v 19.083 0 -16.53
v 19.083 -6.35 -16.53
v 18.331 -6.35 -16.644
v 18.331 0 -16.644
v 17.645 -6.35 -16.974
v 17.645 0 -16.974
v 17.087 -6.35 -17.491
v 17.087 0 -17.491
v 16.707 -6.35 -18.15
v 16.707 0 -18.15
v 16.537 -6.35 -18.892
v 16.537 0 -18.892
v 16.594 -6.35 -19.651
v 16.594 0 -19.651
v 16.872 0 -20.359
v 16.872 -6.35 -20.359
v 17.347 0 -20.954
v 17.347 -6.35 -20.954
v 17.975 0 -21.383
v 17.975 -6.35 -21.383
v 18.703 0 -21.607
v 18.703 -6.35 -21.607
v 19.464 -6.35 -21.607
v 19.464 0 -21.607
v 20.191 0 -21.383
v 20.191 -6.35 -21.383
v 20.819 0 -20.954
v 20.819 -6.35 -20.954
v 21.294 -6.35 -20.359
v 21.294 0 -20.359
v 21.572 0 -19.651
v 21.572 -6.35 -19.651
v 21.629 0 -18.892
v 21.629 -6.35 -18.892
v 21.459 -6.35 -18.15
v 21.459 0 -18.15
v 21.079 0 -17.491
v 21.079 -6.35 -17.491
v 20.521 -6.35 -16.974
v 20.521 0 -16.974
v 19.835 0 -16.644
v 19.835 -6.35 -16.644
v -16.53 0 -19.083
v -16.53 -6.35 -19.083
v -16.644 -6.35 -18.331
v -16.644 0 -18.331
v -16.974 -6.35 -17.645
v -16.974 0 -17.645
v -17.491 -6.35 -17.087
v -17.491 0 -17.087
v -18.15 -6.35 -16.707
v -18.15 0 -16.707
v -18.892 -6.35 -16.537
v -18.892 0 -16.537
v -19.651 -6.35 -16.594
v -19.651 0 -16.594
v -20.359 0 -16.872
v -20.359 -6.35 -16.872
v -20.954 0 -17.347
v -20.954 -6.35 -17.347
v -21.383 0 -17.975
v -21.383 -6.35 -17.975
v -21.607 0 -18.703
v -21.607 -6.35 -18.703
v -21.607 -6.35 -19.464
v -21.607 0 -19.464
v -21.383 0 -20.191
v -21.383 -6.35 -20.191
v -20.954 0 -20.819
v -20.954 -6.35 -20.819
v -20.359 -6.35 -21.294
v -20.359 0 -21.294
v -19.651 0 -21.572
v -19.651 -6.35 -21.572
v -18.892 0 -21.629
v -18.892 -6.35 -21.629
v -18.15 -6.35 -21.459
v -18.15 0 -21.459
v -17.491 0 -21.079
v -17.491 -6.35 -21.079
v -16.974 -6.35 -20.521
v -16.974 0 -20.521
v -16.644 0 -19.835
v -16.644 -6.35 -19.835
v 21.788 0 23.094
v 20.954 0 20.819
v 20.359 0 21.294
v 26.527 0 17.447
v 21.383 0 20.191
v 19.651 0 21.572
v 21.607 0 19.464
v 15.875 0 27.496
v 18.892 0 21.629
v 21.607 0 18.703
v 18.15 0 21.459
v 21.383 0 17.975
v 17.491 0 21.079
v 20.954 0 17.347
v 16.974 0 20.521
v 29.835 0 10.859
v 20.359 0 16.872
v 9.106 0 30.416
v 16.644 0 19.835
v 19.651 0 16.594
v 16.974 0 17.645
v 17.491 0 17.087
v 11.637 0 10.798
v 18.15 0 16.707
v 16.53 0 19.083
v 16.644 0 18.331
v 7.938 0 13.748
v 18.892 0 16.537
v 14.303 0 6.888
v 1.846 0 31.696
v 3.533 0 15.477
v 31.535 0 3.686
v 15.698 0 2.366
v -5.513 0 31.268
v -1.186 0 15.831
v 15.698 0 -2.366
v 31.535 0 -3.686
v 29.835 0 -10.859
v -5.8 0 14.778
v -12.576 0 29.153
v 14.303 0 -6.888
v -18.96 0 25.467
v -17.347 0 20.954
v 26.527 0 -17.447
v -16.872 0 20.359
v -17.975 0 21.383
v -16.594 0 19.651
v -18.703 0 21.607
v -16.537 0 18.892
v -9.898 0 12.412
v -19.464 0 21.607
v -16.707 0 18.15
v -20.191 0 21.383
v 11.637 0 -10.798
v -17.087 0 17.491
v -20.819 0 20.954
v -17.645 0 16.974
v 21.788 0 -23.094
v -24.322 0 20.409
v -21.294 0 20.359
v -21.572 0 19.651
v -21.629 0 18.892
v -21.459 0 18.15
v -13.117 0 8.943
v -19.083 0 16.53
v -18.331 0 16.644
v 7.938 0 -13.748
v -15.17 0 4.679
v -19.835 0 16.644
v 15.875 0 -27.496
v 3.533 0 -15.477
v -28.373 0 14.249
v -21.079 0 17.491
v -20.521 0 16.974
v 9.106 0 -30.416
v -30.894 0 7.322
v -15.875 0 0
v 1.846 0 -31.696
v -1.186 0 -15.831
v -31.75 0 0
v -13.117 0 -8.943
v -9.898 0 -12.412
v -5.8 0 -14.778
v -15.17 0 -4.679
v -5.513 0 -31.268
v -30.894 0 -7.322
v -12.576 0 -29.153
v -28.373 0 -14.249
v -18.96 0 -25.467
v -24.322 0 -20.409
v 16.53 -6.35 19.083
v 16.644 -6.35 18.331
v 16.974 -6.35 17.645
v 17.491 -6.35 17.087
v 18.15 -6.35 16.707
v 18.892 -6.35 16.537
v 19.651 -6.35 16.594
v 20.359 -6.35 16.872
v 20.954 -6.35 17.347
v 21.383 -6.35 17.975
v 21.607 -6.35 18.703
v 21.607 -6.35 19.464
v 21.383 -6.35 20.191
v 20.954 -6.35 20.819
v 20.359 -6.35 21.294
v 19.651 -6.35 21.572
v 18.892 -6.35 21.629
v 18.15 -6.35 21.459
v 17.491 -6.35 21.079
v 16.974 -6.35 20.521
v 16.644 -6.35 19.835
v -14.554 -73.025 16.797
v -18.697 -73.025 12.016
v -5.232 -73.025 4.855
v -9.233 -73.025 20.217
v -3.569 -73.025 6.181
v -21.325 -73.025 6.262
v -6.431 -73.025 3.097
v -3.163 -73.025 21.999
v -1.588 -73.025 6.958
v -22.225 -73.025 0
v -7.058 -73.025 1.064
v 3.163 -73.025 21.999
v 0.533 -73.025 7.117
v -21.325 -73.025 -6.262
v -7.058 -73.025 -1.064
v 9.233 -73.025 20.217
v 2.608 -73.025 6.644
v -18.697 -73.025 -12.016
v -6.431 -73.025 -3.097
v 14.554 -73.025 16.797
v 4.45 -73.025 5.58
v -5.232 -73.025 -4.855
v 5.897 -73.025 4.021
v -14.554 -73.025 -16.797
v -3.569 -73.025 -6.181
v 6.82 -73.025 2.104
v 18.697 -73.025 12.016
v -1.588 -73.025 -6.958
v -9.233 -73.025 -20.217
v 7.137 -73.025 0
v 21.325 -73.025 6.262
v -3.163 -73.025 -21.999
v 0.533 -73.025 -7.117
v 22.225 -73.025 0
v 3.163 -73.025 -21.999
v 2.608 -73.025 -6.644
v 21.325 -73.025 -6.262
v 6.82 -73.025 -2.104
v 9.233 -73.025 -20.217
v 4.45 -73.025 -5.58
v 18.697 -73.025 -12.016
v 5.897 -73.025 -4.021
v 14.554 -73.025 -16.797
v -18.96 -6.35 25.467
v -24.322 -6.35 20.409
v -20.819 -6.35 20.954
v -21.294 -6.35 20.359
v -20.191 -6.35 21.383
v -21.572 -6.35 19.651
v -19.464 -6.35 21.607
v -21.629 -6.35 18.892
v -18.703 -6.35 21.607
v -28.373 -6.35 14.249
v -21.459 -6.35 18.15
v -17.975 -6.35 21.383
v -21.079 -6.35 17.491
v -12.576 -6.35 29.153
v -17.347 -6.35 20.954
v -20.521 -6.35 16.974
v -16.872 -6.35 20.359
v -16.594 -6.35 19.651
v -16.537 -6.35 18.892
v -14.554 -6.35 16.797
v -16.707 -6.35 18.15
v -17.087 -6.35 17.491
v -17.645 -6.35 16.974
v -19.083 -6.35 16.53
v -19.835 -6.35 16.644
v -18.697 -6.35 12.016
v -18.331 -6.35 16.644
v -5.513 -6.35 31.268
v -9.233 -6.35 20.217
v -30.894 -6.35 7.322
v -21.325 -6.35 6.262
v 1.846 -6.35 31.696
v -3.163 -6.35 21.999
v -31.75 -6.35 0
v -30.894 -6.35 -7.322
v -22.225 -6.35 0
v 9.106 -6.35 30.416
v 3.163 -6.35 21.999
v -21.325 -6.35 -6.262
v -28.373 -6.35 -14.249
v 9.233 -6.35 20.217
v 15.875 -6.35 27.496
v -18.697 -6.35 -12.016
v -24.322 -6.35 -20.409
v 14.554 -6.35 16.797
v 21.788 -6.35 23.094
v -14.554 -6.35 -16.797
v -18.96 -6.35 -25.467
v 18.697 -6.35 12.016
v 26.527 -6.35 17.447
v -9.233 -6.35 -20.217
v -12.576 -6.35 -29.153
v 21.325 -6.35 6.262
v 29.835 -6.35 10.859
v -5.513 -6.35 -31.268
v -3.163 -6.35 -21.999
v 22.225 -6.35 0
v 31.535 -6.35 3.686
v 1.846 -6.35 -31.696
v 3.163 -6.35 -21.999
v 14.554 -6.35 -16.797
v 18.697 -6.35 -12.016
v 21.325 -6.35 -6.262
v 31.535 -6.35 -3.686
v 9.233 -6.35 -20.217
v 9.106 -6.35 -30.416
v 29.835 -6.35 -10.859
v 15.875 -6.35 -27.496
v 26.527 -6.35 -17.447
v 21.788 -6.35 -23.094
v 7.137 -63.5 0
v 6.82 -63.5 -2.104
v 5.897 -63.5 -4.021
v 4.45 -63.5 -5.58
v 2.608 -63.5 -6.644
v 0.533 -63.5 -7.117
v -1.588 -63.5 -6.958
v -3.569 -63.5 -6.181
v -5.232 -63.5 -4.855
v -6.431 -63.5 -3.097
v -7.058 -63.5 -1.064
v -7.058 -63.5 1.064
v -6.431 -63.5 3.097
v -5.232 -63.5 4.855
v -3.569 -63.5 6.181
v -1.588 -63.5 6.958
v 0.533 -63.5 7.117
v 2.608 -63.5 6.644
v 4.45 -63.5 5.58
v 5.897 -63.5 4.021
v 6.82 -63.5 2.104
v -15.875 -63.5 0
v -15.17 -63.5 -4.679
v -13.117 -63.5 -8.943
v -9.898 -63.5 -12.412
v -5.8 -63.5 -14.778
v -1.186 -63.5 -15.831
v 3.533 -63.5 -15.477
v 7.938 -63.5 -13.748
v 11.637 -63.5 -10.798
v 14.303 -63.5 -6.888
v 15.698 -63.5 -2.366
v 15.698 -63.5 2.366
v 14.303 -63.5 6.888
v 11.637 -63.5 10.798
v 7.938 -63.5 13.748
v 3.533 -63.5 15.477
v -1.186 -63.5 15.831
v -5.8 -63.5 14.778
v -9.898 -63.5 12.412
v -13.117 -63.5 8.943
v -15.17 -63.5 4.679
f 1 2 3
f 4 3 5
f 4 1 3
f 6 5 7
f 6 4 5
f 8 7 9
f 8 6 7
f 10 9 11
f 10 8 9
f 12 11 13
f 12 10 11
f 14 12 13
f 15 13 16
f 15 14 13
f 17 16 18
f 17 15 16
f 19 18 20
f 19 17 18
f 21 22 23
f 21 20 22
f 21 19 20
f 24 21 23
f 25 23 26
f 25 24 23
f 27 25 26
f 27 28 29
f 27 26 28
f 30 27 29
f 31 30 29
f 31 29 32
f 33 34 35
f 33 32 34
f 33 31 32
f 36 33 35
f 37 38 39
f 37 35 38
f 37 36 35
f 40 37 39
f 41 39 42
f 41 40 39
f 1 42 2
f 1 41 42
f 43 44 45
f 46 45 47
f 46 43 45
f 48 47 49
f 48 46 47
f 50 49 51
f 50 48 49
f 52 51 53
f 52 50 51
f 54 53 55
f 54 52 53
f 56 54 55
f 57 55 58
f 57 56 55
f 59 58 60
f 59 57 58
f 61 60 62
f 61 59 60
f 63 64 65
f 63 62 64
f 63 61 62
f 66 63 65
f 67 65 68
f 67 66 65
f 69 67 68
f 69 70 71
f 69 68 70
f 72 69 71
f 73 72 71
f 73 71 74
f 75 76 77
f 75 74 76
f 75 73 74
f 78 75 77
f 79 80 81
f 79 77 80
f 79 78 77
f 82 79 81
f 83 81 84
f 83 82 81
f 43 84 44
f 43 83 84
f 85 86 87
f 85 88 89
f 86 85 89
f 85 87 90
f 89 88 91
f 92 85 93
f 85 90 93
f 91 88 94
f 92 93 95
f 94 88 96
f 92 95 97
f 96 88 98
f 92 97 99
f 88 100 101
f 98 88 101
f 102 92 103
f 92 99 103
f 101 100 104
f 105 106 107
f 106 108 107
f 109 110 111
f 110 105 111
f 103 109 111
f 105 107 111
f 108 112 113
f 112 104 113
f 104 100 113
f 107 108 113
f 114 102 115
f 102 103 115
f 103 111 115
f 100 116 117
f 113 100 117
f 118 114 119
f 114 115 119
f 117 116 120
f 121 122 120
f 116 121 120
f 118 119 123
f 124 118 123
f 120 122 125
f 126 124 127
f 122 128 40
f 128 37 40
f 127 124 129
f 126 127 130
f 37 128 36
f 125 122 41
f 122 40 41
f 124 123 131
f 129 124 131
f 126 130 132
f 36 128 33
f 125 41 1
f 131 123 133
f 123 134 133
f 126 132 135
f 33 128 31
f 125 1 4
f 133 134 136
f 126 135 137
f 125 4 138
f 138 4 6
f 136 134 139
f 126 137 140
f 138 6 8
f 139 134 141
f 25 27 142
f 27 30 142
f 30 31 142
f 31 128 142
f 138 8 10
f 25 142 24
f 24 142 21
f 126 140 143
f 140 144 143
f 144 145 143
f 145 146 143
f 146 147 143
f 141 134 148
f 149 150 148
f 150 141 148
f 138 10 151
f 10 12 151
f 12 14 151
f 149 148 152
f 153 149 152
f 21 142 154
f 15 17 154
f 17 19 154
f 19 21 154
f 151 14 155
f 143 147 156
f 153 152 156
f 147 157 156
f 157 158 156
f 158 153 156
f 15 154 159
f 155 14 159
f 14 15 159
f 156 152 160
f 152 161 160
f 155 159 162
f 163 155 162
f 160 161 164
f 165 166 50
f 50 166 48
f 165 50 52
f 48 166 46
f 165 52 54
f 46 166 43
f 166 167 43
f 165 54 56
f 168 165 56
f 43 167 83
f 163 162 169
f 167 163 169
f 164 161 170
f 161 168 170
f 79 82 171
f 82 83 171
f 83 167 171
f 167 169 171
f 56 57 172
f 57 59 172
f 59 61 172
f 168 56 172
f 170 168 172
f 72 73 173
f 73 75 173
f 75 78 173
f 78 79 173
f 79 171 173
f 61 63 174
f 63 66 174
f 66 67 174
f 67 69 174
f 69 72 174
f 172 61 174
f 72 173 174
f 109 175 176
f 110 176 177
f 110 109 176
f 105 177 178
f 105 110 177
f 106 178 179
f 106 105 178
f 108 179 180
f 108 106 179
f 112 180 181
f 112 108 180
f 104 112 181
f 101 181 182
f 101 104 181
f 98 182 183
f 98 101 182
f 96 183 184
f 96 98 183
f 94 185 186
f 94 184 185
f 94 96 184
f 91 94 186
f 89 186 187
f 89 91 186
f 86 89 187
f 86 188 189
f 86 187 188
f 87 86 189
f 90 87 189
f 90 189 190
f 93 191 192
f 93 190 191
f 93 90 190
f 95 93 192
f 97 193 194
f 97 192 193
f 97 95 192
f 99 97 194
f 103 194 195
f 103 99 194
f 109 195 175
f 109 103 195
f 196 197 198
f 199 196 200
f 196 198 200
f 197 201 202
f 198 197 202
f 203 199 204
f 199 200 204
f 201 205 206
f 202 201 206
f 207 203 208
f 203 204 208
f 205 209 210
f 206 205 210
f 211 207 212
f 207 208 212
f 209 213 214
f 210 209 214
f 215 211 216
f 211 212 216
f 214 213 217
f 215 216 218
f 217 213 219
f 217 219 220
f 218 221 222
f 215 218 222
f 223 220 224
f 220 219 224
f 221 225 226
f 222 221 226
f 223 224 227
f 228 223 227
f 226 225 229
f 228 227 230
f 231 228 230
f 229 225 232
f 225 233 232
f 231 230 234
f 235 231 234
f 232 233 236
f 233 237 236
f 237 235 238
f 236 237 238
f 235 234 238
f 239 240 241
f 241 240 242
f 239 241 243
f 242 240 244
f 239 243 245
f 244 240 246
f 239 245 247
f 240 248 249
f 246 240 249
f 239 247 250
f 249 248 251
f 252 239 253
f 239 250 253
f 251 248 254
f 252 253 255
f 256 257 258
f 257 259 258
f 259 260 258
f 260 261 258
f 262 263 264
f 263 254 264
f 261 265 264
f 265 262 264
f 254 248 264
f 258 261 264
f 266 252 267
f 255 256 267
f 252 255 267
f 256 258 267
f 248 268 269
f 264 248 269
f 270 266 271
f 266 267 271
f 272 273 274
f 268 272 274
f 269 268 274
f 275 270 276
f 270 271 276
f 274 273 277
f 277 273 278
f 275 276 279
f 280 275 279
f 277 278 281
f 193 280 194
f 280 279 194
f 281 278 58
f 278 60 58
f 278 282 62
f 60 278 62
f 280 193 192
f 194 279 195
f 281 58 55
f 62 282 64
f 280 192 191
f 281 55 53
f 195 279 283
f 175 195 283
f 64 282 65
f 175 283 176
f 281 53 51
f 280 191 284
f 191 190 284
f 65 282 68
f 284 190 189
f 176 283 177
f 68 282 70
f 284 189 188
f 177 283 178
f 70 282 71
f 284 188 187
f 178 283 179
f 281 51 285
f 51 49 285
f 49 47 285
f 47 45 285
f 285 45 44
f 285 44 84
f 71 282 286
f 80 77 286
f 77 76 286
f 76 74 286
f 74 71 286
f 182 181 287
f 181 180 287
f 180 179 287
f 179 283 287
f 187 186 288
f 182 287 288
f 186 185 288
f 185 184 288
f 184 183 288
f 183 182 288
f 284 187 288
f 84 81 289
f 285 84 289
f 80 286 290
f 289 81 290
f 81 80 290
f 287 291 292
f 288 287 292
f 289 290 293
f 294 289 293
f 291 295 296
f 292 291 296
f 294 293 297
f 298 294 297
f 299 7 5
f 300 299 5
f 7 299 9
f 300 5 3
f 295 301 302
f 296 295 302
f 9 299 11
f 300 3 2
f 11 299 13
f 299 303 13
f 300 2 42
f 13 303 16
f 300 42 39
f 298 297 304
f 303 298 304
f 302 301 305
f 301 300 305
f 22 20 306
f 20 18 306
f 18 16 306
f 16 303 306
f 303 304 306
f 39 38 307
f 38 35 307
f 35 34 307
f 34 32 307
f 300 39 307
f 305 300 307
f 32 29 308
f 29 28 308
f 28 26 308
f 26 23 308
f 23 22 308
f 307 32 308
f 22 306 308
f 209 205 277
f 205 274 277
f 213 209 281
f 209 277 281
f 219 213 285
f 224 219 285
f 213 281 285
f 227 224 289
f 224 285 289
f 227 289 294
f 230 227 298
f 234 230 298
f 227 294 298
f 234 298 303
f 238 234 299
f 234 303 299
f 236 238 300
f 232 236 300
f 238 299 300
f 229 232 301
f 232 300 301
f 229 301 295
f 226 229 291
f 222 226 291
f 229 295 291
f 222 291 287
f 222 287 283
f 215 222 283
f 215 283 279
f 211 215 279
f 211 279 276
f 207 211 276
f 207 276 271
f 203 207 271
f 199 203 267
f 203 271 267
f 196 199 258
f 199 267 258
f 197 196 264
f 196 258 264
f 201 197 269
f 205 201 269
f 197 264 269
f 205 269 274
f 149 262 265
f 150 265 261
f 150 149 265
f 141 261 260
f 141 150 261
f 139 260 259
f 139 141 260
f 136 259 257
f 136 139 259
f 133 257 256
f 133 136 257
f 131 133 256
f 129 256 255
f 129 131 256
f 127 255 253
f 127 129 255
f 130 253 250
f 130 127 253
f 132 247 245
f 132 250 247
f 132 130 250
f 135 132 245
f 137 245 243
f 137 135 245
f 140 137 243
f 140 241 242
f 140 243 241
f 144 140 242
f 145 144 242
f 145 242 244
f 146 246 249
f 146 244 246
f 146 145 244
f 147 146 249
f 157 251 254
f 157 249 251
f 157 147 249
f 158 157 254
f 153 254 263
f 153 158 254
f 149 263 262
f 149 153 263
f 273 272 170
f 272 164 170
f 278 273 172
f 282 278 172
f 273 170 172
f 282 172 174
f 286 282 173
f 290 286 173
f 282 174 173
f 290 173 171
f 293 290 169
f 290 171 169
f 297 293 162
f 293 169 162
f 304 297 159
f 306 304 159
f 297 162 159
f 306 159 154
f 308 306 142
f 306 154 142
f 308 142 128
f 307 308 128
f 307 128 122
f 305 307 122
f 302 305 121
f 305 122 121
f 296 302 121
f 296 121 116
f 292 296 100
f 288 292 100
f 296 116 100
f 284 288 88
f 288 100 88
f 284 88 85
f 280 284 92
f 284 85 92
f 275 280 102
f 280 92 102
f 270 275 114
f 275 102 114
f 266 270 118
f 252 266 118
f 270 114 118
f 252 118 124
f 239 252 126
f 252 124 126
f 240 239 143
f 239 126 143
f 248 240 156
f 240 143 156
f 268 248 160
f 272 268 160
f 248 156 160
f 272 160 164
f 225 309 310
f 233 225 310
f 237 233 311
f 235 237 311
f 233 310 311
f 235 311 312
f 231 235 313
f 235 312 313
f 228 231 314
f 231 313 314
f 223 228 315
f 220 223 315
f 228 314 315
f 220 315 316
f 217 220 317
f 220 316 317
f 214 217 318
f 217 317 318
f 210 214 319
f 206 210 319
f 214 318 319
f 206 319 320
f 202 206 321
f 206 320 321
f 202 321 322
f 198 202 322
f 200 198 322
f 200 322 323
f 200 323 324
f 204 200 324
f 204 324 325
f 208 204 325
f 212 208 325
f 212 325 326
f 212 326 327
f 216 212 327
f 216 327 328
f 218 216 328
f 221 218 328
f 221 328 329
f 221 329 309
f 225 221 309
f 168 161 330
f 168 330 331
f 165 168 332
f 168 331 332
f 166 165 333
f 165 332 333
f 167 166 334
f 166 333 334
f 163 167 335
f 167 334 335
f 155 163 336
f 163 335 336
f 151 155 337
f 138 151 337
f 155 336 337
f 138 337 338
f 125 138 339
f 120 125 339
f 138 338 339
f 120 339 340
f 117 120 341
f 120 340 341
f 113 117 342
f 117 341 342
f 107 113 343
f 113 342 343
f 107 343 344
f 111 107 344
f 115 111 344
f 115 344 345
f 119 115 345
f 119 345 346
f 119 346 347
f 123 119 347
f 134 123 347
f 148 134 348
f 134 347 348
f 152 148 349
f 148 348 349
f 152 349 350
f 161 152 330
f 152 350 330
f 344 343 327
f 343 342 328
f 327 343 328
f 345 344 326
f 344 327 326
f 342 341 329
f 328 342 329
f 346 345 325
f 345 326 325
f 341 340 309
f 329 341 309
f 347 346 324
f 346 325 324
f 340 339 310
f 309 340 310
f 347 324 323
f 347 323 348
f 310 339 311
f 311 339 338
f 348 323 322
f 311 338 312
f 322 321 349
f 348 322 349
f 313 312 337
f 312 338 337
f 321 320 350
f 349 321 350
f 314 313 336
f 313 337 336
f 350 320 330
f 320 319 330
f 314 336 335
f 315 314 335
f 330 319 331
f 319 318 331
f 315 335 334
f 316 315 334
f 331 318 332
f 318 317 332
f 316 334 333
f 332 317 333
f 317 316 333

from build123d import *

# Parameters (mm, degrees)
PIPE_TAP_DRILL_FOR_3_8_TAP1_D     = 14.2748
PIPE_TAP_DRILL_FOR_3_8_TAP1_DEPTH = 25.4
PIPE_TAP_DRILL_FOR_3_8_TAP1_TIP   = 4.288582582
CIRPATTERN1_COUNT                 = 4


with BuildPart() as part:
    # Sketch1 → Revolve1 (revolve)
    with BuildSketch(Plane.XY):
        Polygon((-31.75, 0), (-15.875, 0), (-15.875, -63.5), (0, -63.5), (0, -73.025), (-22.225, -73.025), (-22.225, -6.35), (-31.75, -6.35), align=None)
    revolve(axis=Axis((0, 0, 0), (0, -1, 0)))

    # Pipe Tap Drill for 3/8 Tap1
    with Locations(Plane(origin=(0, -73.025, 0), x_dir=(-1, 0, 0), z_dir=(0, -1, 0))):
        with Locations((0, 0)):
            Hole(PIPE_TAP_DRILL_FOR_3_8_TAP1_D / 2, depth=PIPE_TAP_DRILL_FOR_3_8_TAP1_DEPTH)
            with Locations((0, 0, -(PIPE_TAP_DRILL_FOR_3_8_TAP1_DEPTH + PIPE_TAP_DRILL_FOR_3_8_TAP1_TIP / 2))):  # 118° drill point
                Cone(0, PIPE_TAP_DRILL_FOR_3_8_TAP1_D / 2, PIPE_TAP_DRILL_FOR_3_8_TAP1_TIP, mode=Mode.SUBTRACT)

    # Sketch3 → #10 Clearance Hole1 (revolve, cut)
    with BuildSketch(Plane(origin=(19.083044257, 0, -19.083044257), x_dir=(0, 0, 1), z_dir=(1, 0, 0))):
        Polygon((0, 0), (0, 26.933816902), (2.5527, 25.4), (2.5527, 0), align=None)
    f_10_clearance_hole1 = revolve(axis=Axis((19.083044257, 6.35, -19.083044257), (0, -1, 0)), mode=Mode.SUBTRACT)

    # CirPattern1: #10 Clearance Hole1 ×4 about axis
    cirpattern1_axis = Axis((0, 0, 0), (0, 1, 0))
    for i in range(1, CIRPATTERN1_COUNT):
        add(f_10_clearance_hole1.rotate(cirpattern1_axis, i * 360 / CIRPATTERN1_COUNT), mode=Mode.SUBTRACT)


solid = part.part
